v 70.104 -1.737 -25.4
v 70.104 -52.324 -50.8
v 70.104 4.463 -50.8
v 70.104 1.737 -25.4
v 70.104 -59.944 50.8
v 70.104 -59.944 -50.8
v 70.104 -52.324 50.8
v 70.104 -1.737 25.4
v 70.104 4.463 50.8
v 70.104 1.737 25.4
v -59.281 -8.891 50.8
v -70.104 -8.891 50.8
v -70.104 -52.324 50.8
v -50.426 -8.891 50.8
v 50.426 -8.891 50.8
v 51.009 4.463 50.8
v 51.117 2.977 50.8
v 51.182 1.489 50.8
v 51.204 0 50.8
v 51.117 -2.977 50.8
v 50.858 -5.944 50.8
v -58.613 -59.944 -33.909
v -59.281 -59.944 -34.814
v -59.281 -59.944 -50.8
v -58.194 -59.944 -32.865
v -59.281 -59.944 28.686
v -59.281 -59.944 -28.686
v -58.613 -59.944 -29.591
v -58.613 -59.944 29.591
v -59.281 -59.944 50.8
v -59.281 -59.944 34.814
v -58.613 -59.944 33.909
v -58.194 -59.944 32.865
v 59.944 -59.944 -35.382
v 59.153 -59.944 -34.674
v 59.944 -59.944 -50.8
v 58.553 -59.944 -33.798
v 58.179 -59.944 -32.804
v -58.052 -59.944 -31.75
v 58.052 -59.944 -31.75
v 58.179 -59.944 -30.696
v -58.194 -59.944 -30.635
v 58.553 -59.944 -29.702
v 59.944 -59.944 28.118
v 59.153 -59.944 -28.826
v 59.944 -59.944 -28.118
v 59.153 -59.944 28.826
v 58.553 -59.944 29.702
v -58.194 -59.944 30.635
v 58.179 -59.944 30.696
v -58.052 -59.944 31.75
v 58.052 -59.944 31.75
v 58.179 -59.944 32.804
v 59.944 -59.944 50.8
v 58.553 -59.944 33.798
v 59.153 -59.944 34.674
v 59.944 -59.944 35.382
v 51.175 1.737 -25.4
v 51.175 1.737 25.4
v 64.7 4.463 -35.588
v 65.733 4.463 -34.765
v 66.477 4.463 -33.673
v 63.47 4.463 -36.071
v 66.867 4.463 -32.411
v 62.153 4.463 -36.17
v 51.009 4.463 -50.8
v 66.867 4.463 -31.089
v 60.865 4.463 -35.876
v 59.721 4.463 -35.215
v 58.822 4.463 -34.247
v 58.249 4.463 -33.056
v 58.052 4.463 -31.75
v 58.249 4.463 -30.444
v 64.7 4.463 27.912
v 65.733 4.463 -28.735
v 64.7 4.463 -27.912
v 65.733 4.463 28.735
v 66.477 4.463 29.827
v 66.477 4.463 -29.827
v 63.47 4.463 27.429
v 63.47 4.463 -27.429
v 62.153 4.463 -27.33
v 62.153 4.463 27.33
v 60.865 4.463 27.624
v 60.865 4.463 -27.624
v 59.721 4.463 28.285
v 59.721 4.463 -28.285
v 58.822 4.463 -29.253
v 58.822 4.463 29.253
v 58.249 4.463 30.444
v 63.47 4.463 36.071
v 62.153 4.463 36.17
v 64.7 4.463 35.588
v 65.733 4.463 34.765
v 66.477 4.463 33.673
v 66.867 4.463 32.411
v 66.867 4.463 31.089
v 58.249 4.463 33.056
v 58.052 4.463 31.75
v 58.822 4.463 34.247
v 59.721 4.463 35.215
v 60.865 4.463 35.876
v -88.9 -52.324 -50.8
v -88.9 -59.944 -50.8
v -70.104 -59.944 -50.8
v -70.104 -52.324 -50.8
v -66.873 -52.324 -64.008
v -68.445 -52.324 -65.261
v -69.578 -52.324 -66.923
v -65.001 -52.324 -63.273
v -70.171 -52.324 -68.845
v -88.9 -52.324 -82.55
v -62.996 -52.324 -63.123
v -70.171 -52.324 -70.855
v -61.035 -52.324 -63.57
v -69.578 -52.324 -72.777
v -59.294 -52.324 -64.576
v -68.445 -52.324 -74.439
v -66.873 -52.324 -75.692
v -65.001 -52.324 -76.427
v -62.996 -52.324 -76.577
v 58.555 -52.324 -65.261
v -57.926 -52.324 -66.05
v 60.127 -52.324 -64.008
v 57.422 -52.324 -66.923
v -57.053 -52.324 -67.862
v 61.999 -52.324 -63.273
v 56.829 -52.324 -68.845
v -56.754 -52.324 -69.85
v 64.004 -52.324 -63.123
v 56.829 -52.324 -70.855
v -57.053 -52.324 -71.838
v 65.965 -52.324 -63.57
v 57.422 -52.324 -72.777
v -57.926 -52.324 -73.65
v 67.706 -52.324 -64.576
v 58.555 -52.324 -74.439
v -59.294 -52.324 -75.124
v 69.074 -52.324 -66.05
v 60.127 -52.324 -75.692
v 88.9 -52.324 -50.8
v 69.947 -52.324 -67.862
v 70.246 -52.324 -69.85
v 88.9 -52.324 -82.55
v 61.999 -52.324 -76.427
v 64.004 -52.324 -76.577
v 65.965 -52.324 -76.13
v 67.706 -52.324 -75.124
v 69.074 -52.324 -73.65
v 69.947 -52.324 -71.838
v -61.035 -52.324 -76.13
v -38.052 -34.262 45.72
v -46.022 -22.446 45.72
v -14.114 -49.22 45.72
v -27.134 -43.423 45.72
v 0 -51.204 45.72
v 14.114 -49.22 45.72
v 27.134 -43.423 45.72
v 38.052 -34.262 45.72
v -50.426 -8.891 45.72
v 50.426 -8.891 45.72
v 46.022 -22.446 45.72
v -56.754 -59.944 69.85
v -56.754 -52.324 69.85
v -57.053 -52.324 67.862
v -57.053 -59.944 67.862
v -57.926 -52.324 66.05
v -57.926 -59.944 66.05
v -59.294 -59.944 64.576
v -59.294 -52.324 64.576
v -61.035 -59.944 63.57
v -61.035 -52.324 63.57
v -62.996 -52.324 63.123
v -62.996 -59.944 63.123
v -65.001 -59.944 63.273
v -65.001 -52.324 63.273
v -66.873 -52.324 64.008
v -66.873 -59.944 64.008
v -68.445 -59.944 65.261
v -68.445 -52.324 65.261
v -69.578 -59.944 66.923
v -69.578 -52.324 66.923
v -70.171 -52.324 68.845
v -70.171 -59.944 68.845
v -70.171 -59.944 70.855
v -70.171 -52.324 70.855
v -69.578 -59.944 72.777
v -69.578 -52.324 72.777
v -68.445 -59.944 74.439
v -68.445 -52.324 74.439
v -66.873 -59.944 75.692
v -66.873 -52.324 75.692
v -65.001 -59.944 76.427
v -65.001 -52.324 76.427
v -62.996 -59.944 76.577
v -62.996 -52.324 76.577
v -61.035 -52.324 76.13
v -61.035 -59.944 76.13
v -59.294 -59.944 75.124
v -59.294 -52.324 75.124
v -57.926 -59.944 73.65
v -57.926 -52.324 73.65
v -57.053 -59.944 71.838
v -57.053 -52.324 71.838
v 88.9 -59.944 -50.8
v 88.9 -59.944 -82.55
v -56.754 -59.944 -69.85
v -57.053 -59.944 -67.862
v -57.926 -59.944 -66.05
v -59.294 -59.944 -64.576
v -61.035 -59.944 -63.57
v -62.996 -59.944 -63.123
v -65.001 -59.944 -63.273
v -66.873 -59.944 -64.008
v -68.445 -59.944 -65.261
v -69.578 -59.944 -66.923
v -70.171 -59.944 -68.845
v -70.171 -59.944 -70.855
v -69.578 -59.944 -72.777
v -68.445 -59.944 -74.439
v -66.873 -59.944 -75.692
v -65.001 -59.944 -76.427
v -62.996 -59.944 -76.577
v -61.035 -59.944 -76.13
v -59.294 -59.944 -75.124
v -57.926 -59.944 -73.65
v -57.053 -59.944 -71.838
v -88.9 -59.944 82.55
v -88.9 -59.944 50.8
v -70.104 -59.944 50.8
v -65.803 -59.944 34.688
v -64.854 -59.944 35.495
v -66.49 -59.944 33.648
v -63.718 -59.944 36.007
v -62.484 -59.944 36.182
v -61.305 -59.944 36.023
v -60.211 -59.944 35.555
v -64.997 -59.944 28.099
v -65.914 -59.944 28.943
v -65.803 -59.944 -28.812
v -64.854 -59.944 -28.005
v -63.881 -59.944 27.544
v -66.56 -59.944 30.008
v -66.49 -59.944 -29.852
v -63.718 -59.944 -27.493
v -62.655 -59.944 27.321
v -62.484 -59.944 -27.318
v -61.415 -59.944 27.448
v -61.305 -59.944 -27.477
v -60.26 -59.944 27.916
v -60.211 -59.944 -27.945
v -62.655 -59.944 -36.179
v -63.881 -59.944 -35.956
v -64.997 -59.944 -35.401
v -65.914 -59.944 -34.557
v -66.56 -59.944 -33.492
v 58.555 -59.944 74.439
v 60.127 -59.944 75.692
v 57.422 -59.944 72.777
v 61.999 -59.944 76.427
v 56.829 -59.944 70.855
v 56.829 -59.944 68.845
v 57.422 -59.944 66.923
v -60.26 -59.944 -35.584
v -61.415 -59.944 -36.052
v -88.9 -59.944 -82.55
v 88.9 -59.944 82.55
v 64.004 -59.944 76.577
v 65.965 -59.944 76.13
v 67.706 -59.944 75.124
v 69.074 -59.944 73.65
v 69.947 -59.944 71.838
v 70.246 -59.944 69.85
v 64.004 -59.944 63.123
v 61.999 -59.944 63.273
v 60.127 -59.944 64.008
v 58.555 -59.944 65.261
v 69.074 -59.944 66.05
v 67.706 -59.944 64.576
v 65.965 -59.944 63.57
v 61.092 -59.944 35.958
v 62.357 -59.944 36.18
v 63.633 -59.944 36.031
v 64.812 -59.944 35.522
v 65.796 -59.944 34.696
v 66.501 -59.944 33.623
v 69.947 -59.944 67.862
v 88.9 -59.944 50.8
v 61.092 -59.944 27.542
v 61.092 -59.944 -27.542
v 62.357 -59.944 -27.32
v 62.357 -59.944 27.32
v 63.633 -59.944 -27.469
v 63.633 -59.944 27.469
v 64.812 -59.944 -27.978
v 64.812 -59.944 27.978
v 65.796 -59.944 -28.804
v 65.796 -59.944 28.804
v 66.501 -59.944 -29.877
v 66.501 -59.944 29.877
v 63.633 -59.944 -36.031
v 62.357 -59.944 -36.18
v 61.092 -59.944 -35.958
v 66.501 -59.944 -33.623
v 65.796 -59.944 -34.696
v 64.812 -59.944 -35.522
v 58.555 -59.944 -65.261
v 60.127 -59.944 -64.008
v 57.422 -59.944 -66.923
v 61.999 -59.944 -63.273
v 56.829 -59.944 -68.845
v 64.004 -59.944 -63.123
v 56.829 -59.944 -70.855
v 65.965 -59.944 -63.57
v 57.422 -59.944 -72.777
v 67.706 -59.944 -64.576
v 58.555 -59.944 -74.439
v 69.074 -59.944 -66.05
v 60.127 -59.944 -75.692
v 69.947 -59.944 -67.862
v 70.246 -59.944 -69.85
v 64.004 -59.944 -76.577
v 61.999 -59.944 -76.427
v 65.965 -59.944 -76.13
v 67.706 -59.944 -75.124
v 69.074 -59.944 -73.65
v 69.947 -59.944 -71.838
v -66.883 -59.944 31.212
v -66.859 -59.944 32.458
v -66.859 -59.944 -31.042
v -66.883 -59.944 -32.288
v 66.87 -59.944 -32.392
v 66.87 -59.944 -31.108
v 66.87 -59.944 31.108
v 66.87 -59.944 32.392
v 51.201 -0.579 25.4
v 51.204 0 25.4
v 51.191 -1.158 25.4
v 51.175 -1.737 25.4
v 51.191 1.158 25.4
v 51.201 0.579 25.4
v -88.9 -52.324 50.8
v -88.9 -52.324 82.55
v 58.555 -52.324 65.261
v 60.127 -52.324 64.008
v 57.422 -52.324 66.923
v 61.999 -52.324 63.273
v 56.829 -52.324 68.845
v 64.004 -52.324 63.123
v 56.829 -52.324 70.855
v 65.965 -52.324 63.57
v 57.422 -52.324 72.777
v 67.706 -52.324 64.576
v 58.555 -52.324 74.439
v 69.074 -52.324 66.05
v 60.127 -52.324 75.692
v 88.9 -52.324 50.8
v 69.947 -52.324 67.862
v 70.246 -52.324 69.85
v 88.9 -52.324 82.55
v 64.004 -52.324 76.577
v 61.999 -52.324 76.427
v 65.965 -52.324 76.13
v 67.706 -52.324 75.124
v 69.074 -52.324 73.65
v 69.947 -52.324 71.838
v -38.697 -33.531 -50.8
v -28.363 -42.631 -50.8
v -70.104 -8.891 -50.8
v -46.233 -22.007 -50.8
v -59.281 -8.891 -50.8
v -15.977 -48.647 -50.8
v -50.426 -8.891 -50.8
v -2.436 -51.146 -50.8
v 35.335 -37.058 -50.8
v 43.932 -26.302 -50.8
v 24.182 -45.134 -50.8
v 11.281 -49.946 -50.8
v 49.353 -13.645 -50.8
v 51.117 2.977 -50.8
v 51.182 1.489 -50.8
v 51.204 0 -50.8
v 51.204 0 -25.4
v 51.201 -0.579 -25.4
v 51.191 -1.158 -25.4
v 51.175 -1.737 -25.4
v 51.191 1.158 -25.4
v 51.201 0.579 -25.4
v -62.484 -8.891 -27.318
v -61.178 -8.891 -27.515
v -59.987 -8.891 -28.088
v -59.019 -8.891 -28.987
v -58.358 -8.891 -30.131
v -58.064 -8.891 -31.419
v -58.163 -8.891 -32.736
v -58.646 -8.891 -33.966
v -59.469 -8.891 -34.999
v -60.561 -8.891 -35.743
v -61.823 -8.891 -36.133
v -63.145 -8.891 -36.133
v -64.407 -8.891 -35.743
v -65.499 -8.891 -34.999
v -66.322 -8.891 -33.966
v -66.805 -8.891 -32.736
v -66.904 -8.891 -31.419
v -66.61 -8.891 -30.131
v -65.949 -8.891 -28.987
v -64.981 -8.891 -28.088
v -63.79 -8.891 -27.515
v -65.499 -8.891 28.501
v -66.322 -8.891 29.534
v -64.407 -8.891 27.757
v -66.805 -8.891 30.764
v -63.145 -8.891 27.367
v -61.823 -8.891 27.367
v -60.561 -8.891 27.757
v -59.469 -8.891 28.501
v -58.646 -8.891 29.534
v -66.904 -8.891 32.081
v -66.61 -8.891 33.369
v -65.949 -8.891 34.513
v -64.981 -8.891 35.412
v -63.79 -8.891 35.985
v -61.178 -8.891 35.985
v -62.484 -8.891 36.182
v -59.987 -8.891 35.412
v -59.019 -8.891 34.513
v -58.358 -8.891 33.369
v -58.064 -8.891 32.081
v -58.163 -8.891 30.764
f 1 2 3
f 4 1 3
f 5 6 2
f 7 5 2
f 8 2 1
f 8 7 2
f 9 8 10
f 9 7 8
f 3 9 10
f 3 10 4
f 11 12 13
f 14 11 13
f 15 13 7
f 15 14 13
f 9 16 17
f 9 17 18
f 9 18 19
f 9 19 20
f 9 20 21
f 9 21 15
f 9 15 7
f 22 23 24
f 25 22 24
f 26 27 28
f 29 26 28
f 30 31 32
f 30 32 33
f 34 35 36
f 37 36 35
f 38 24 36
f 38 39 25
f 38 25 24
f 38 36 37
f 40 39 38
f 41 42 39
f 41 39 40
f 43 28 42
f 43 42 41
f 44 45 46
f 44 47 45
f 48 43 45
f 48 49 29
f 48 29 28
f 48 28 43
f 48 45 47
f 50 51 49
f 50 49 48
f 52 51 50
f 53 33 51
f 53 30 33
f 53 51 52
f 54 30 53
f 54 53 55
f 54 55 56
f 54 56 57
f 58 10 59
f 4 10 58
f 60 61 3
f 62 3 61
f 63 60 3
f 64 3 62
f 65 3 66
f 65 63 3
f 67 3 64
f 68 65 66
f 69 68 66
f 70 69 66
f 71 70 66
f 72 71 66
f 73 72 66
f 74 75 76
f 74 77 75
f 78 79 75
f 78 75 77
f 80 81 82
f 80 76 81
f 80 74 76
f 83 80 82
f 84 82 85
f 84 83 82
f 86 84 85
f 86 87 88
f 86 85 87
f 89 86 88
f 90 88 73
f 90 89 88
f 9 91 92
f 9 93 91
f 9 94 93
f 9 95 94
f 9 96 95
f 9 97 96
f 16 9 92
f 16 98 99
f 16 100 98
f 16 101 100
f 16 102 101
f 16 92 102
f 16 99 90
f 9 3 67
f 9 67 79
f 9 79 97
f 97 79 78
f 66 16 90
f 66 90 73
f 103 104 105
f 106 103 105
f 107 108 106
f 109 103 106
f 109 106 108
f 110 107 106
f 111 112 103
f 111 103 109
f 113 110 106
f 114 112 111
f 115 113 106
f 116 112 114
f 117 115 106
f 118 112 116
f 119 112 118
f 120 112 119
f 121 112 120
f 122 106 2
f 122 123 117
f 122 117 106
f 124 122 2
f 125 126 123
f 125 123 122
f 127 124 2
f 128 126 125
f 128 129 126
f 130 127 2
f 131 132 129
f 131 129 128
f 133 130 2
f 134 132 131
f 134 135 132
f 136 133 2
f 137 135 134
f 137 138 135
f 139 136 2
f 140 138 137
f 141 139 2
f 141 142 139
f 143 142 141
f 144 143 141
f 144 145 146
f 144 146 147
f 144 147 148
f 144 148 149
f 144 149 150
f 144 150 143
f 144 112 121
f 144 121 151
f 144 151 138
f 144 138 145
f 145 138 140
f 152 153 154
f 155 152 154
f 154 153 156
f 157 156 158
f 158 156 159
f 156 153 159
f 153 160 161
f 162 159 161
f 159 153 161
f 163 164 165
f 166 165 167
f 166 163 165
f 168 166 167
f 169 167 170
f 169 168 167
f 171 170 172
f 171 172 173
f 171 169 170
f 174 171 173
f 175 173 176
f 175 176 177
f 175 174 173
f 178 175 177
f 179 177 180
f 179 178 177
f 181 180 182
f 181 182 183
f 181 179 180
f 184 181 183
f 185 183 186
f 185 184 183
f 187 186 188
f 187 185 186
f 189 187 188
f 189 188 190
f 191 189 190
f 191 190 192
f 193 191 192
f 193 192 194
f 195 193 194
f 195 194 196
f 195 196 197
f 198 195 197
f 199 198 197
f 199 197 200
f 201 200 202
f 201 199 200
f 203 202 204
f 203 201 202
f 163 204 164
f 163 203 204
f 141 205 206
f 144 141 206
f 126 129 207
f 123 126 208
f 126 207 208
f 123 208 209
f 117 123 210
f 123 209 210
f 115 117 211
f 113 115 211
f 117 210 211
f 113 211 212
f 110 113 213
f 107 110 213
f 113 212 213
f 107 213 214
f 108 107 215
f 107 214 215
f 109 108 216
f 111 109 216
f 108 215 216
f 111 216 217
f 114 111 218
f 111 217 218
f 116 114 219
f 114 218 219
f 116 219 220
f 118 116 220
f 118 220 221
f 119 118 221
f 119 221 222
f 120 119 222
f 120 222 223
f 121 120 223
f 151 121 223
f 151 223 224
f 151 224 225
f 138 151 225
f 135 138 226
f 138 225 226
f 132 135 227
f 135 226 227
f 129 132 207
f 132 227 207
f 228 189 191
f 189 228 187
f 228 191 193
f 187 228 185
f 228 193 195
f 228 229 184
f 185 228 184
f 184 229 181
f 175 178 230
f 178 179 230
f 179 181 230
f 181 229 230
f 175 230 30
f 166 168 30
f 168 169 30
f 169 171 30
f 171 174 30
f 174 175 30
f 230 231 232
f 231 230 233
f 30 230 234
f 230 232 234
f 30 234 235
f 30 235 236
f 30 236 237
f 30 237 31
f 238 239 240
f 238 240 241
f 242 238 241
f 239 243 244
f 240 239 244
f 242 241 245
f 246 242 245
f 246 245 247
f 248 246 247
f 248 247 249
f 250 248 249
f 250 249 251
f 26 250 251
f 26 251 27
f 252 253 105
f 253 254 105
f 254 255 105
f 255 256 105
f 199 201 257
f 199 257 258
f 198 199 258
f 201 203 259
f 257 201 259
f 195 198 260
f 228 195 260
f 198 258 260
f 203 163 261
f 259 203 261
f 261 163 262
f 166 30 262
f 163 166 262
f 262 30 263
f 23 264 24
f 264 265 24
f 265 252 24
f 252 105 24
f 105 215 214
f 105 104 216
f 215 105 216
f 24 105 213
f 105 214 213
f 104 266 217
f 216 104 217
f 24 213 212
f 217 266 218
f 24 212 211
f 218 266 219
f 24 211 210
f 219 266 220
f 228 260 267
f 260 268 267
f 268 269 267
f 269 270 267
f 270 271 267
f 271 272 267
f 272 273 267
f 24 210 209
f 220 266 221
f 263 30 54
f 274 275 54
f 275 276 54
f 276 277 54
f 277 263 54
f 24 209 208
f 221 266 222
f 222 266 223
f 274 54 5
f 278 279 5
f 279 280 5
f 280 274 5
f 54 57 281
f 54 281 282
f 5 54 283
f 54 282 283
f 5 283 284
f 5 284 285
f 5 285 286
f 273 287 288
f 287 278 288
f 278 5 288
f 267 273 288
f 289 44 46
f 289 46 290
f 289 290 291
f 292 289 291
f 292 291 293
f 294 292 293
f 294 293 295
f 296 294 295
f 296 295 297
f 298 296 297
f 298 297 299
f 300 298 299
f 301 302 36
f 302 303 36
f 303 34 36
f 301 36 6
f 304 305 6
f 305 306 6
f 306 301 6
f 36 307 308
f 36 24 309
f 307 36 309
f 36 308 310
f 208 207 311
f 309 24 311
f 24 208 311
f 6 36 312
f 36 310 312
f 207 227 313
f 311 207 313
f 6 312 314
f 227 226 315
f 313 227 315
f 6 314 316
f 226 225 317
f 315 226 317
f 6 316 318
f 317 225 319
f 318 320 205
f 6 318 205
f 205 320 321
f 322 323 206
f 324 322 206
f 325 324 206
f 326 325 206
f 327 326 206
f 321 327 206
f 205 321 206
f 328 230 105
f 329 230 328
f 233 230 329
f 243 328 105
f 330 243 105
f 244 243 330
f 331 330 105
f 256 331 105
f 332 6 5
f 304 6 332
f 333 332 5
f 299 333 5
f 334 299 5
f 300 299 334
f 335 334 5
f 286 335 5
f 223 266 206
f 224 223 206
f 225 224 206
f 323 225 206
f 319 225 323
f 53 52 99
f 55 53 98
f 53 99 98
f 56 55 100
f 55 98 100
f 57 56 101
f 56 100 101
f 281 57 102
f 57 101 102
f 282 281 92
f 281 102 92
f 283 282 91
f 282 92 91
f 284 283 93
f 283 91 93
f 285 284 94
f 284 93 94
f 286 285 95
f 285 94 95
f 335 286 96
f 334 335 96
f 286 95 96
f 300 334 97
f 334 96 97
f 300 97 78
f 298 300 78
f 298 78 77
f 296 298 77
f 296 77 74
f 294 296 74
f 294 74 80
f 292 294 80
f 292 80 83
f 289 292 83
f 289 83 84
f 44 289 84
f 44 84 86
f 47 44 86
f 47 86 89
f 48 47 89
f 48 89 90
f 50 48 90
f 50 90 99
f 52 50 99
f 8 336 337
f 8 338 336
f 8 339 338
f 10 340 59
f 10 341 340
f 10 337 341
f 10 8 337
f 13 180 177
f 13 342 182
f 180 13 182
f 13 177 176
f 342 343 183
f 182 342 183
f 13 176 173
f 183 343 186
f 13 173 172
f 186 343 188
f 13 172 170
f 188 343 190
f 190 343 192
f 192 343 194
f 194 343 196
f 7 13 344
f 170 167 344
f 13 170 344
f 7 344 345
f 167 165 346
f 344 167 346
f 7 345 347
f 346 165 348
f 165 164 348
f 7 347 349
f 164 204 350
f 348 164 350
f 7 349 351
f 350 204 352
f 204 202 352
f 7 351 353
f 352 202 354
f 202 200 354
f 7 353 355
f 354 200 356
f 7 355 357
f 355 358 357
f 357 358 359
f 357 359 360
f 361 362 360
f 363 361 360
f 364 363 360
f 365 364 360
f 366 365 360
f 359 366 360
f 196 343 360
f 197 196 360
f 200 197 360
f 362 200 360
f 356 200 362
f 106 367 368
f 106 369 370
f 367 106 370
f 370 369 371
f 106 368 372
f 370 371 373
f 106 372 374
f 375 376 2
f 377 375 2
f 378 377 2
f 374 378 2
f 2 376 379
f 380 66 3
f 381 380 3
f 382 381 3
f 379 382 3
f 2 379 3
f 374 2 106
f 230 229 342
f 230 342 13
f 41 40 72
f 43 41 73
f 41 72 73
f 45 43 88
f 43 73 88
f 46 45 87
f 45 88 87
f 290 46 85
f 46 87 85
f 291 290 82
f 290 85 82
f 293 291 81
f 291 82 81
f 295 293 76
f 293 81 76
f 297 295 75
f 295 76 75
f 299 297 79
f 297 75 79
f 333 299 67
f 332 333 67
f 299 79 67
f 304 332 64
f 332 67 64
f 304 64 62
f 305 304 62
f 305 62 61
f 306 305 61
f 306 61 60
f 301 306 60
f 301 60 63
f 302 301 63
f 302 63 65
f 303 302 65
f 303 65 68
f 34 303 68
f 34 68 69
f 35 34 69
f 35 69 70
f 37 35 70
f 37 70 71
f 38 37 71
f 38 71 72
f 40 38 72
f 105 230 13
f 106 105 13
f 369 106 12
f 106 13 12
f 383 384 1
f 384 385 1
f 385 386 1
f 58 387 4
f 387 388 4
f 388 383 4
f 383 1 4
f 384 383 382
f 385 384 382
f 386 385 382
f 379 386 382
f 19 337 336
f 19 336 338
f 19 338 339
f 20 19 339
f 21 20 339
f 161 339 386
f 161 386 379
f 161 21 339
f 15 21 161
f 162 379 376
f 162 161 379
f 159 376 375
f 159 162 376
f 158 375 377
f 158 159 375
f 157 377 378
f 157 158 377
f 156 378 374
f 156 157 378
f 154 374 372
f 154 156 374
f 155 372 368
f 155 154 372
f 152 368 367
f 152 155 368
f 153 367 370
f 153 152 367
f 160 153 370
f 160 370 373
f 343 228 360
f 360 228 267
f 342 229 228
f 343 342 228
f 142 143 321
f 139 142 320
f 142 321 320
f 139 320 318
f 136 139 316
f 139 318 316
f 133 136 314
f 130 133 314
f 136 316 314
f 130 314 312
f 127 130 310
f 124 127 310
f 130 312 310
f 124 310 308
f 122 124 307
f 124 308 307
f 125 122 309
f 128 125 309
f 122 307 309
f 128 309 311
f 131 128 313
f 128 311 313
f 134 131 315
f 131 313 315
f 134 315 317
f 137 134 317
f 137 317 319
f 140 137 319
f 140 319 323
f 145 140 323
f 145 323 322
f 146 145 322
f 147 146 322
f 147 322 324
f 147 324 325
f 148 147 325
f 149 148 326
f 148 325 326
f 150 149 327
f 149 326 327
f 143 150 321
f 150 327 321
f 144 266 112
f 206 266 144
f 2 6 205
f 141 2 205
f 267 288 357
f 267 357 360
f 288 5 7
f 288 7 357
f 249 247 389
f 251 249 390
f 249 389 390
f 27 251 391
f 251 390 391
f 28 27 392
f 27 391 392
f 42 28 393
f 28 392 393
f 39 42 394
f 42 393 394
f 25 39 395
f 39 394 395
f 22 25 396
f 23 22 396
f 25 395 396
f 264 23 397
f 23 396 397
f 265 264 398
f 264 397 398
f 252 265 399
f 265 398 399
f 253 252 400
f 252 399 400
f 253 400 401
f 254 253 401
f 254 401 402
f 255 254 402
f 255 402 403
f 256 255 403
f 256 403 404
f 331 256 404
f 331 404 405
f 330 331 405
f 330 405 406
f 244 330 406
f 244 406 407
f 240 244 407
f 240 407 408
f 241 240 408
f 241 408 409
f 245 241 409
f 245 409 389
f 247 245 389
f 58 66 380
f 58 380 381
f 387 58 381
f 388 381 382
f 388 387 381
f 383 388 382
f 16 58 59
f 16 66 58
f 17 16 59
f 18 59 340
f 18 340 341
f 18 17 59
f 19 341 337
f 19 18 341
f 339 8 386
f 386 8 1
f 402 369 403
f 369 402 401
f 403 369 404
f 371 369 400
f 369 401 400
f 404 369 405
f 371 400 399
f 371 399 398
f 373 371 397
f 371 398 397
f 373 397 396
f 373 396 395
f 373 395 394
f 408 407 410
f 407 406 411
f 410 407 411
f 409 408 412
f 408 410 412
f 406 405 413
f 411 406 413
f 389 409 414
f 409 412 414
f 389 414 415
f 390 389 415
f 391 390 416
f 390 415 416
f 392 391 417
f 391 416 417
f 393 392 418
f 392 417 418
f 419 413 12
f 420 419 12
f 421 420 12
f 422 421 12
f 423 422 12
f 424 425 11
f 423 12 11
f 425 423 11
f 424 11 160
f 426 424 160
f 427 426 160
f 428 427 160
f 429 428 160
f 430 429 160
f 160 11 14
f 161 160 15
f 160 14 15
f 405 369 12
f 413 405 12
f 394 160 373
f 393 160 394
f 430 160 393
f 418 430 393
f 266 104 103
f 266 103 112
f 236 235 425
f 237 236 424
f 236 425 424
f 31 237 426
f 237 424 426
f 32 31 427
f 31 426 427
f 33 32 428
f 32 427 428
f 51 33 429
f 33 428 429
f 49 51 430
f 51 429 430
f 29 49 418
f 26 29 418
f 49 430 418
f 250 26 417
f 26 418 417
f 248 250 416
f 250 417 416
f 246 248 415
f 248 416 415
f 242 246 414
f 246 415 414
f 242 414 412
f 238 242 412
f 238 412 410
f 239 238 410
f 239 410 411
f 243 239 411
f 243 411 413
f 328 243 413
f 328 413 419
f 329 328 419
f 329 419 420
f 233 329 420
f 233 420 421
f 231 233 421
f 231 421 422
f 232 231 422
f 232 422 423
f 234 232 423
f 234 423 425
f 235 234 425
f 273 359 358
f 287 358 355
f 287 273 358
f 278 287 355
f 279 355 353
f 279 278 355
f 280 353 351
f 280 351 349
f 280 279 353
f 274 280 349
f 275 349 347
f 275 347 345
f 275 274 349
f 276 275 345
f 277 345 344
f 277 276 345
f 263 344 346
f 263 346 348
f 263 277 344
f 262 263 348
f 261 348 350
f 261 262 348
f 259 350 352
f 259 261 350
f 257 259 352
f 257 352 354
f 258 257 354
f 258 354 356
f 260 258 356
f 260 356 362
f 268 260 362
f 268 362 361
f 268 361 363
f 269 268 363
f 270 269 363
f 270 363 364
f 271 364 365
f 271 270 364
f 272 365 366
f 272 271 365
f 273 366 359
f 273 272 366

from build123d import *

# Parameters (mm, degrees)
SKETCH1_W                       = 10.823103443
SKETCH1_H                       = 51.052518719
BOSS_EXTRUDE1_DEPTH             = 50.8
SKETCH2_W                       = 177.8
SKETCH2_H                       = 31.75
BOSS_EXTRUDE2_DEPTH             = 7.62
F_1_2_START                     = -59.944
F_1_2_CLEARANCE_HOLE1_OUTLINE_R = 6.74624
F_1_2_CLEARANCE_HOLE1_DEPTH     = 7.62
SKETCH7_W                       = 140.208
SKETCH7_H                       = 43.432518719
BOSS_EXTRUDE3_DEPTH             = 5.08
CUT_EXTRUDE1_REACH              = 190.918
CUT_EXTRUDE1_END_RADIUS         = 51.203999954
SKETCH6_W                       = 50.8
SKETCH6_H                       = 3.474999908
SKETCH8_R                       = 4.4323
CUT_EXTRUDE2_DEPTH              = 138.353334223
SKETCH9_R                       = 4.4323
CUT_EXTRUDE3_DEPTH              = 132.62094122


# Read off the part's stored shape, not the designer's step: 1/2 Clearance Hole1
with BuildPart() as part:
    # Sketch1 → Boss-Extrude1 (new, symmetric)
    with BuildSketch(Plane.XY):
        with Locations((-64.692448278, -34.41774064)):
            Rectangle(SKETCH1_W, SKETCH1_H)
        with BuildLine():
            ThreePointArc((-2e-09, -59.944), (-39.117081832, -45.421768404), (-59.280896557, -8.891481281))
            Line((-59.280896557, -8.891481281), (-59.280896557, -59.944))
            Line((-59.280896557, -59.944), (-2e-09, -59.944))
        make_face()
        with BuildLine():
            Line((-50.42609614, -8.891481281), (-59.280896557, -8.891481281))
            ThreePointArc((-59.280896557, -8.891481281), (-39.117081832, -45.421768404), (-2e-09, -59.944))
            ThreePointArc((-2e-09, -59.944), (42.386808891, -42.386808892), (59.944, 0))
            ThreePointArc((59.944, 0), (59.902397652, 2.232911009), (59.777648353, 4.462722648))
            Line((59.777648353, 4.462722648), (51.009153275, 4.462722648))
            ThreePointArc((51.009153275, 4.462722648), (51.155265092, 2.233487109), (51.203999954, 0))
            ThreePointArc((51.203999954, 0), (4.462722648, -51.009153275), (-50.42609614, -8.891481281))
        make_face()
        with BuildLine():
            ThreePointArc((59.944, 0), (42.386808891, -42.386808892), (-2e-09, -59.944))
            Line((-2e-09, -59.944), (59.944, -59.944))
            Line((59.944, -59.944), (59.944, 0))
        make_face()
        with BuildLine():
            Line((70.104, 4.462722648), (59.777648353, 4.462722648))
            ThreePointArc((59.777648353, 4.462722648), (59.902397652, 2.232911009), (59.944, 0))
            Line((59.944, 0), (59.944, -59.944))
            Line((59.944, -59.944), (70.104, -59.944))
            Line((70.104, -59.944), (70.104, 4.462722648))
        make_face()
    extrude(amount=BOSS_EXTRUDE1_DEPTH, both=True)

    # Sketch2 → Boss-Extrude2 (add)
    with BuildSketch(Plane.XZ.offset(59.944)):
        with Locations((0, 66.675)):
            Rectangle(SKETCH2_W, SKETCH2_H)
    boss_extrude2 = extrude(amount=-BOSS_EXTRUDE2_DEPTH)

    # 1/2 Clearance Hole1 outline → 1/2 Clearance Hole1 (cut)
    with BuildSketch(Plane(origin=(0, 0, 0), x_dir=(1, 0, 0), z_dir=(0, 1, 0)).offset(F_1_2_START)):
        with Locations((63.5, -69.85)):
            Circle(F_1_2_CLEARANCE_HOLE1_OUTLINE_R)
        with Locations((-63.5, -69.85)):
            Circle(F_1_2_CLEARANCE_HOLE1_OUTLINE_R)
    f_1_2_clearance_hole1 = extrude(amount=F_1_2_CLEARANCE_HOLE1_DEPTH, mode=Mode.SUBTRACT)

    # Mirror1: Boss-Extrude2, 1/2 Clearance Hole1 across plane
    add(boss_extrude2.mirror(Plane.XY))
    add(f_1_2_clearance_hole1.mirror(Plane.XY), mode=Mode.SUBTRACT)

    # Sketch7 → Boss-Extrude3 (add)
    with BuildSketch(Plane.XY.offset(50.8)):
        with Locations((0, -30.607740641)):
            Rectangle(SKETCH7_W, SKETCH7_H)
    extrude(amount=-BOSS_EXTRUDE3_DEPTH)

    # Cut-Extrude1: up to this cylinder (the profile starts outside it)
    cut_extrude1_end = Plane(origin=(0, 0, 0), z_dir=(0, 0, 1)) * Cylinder(CUT_EXTRUDE1_END_RADIUS, 485.243999908, mode=Mode.PRIVATE)
    # Sketch6 → Cut-Extrude1 (cut, up to the surface)
    with BuildSketch(Plane(origin=(70.104, 0, 0), x_dir=(0, 0, -1), z_dir=(1, 0, 0)), mode=Mode.PRIVATE) as cut_extrude1_sk1:
        Rectangle(SKETCH6_W, SKETCH6_H)
    cut_extrude1_tool1 = extrude(cut_extrude1_sk1.sketch, amount=-CUT_EXTRUDE1_REACH, mode=Mode.PRIVATE) - cut_extrude1_end
    add(cut_extrude1_tool1.solids().sort_by_distance((70.104, 0, 0))[0], mode=Mode.SUBTRACT)

    # Sketch8 → Cut-Extrude2 (cut, through all)
    with BuildSketch(Plane(origin=(0, 4.462722648, 0), x_dir=(1, 0, 0), z_dir=(0, 1, 0))):
        with Locations(Location((62.484, 31.75, 0), (0, 0, 180))):
            Circle(SKETCH8_R)
        with Locations(Location((62.484, -31.75, 0), (0, 0, 180))):
            Circle(SKETCH8_R)
    extrude(amount=-CUT_EXTRUDE2_DEPTH, mode=Mode.SUBTRACT)

    # Sketch9 → Cut-Extrude3 (cut, through all)
    with BuildSketch(Plane(origin=(0, -8.891481281, 0), x_dir=(1, 0, 0), z_dir=(0, 1, 0))):
        with Locations(Location((-62.484, 31.75, 0), (0, 0, 270))):
            Circle(SKETCH9_R)
        with Locations(Location((-62.484, -31.75, 0), (0, 0, 270))):
            Circle(SKETCH9_R)
    extrude(amount=-CUT_EXTRUDE3_DEPTH, mode=Mode.SUBTRACT)


solid = part.part
